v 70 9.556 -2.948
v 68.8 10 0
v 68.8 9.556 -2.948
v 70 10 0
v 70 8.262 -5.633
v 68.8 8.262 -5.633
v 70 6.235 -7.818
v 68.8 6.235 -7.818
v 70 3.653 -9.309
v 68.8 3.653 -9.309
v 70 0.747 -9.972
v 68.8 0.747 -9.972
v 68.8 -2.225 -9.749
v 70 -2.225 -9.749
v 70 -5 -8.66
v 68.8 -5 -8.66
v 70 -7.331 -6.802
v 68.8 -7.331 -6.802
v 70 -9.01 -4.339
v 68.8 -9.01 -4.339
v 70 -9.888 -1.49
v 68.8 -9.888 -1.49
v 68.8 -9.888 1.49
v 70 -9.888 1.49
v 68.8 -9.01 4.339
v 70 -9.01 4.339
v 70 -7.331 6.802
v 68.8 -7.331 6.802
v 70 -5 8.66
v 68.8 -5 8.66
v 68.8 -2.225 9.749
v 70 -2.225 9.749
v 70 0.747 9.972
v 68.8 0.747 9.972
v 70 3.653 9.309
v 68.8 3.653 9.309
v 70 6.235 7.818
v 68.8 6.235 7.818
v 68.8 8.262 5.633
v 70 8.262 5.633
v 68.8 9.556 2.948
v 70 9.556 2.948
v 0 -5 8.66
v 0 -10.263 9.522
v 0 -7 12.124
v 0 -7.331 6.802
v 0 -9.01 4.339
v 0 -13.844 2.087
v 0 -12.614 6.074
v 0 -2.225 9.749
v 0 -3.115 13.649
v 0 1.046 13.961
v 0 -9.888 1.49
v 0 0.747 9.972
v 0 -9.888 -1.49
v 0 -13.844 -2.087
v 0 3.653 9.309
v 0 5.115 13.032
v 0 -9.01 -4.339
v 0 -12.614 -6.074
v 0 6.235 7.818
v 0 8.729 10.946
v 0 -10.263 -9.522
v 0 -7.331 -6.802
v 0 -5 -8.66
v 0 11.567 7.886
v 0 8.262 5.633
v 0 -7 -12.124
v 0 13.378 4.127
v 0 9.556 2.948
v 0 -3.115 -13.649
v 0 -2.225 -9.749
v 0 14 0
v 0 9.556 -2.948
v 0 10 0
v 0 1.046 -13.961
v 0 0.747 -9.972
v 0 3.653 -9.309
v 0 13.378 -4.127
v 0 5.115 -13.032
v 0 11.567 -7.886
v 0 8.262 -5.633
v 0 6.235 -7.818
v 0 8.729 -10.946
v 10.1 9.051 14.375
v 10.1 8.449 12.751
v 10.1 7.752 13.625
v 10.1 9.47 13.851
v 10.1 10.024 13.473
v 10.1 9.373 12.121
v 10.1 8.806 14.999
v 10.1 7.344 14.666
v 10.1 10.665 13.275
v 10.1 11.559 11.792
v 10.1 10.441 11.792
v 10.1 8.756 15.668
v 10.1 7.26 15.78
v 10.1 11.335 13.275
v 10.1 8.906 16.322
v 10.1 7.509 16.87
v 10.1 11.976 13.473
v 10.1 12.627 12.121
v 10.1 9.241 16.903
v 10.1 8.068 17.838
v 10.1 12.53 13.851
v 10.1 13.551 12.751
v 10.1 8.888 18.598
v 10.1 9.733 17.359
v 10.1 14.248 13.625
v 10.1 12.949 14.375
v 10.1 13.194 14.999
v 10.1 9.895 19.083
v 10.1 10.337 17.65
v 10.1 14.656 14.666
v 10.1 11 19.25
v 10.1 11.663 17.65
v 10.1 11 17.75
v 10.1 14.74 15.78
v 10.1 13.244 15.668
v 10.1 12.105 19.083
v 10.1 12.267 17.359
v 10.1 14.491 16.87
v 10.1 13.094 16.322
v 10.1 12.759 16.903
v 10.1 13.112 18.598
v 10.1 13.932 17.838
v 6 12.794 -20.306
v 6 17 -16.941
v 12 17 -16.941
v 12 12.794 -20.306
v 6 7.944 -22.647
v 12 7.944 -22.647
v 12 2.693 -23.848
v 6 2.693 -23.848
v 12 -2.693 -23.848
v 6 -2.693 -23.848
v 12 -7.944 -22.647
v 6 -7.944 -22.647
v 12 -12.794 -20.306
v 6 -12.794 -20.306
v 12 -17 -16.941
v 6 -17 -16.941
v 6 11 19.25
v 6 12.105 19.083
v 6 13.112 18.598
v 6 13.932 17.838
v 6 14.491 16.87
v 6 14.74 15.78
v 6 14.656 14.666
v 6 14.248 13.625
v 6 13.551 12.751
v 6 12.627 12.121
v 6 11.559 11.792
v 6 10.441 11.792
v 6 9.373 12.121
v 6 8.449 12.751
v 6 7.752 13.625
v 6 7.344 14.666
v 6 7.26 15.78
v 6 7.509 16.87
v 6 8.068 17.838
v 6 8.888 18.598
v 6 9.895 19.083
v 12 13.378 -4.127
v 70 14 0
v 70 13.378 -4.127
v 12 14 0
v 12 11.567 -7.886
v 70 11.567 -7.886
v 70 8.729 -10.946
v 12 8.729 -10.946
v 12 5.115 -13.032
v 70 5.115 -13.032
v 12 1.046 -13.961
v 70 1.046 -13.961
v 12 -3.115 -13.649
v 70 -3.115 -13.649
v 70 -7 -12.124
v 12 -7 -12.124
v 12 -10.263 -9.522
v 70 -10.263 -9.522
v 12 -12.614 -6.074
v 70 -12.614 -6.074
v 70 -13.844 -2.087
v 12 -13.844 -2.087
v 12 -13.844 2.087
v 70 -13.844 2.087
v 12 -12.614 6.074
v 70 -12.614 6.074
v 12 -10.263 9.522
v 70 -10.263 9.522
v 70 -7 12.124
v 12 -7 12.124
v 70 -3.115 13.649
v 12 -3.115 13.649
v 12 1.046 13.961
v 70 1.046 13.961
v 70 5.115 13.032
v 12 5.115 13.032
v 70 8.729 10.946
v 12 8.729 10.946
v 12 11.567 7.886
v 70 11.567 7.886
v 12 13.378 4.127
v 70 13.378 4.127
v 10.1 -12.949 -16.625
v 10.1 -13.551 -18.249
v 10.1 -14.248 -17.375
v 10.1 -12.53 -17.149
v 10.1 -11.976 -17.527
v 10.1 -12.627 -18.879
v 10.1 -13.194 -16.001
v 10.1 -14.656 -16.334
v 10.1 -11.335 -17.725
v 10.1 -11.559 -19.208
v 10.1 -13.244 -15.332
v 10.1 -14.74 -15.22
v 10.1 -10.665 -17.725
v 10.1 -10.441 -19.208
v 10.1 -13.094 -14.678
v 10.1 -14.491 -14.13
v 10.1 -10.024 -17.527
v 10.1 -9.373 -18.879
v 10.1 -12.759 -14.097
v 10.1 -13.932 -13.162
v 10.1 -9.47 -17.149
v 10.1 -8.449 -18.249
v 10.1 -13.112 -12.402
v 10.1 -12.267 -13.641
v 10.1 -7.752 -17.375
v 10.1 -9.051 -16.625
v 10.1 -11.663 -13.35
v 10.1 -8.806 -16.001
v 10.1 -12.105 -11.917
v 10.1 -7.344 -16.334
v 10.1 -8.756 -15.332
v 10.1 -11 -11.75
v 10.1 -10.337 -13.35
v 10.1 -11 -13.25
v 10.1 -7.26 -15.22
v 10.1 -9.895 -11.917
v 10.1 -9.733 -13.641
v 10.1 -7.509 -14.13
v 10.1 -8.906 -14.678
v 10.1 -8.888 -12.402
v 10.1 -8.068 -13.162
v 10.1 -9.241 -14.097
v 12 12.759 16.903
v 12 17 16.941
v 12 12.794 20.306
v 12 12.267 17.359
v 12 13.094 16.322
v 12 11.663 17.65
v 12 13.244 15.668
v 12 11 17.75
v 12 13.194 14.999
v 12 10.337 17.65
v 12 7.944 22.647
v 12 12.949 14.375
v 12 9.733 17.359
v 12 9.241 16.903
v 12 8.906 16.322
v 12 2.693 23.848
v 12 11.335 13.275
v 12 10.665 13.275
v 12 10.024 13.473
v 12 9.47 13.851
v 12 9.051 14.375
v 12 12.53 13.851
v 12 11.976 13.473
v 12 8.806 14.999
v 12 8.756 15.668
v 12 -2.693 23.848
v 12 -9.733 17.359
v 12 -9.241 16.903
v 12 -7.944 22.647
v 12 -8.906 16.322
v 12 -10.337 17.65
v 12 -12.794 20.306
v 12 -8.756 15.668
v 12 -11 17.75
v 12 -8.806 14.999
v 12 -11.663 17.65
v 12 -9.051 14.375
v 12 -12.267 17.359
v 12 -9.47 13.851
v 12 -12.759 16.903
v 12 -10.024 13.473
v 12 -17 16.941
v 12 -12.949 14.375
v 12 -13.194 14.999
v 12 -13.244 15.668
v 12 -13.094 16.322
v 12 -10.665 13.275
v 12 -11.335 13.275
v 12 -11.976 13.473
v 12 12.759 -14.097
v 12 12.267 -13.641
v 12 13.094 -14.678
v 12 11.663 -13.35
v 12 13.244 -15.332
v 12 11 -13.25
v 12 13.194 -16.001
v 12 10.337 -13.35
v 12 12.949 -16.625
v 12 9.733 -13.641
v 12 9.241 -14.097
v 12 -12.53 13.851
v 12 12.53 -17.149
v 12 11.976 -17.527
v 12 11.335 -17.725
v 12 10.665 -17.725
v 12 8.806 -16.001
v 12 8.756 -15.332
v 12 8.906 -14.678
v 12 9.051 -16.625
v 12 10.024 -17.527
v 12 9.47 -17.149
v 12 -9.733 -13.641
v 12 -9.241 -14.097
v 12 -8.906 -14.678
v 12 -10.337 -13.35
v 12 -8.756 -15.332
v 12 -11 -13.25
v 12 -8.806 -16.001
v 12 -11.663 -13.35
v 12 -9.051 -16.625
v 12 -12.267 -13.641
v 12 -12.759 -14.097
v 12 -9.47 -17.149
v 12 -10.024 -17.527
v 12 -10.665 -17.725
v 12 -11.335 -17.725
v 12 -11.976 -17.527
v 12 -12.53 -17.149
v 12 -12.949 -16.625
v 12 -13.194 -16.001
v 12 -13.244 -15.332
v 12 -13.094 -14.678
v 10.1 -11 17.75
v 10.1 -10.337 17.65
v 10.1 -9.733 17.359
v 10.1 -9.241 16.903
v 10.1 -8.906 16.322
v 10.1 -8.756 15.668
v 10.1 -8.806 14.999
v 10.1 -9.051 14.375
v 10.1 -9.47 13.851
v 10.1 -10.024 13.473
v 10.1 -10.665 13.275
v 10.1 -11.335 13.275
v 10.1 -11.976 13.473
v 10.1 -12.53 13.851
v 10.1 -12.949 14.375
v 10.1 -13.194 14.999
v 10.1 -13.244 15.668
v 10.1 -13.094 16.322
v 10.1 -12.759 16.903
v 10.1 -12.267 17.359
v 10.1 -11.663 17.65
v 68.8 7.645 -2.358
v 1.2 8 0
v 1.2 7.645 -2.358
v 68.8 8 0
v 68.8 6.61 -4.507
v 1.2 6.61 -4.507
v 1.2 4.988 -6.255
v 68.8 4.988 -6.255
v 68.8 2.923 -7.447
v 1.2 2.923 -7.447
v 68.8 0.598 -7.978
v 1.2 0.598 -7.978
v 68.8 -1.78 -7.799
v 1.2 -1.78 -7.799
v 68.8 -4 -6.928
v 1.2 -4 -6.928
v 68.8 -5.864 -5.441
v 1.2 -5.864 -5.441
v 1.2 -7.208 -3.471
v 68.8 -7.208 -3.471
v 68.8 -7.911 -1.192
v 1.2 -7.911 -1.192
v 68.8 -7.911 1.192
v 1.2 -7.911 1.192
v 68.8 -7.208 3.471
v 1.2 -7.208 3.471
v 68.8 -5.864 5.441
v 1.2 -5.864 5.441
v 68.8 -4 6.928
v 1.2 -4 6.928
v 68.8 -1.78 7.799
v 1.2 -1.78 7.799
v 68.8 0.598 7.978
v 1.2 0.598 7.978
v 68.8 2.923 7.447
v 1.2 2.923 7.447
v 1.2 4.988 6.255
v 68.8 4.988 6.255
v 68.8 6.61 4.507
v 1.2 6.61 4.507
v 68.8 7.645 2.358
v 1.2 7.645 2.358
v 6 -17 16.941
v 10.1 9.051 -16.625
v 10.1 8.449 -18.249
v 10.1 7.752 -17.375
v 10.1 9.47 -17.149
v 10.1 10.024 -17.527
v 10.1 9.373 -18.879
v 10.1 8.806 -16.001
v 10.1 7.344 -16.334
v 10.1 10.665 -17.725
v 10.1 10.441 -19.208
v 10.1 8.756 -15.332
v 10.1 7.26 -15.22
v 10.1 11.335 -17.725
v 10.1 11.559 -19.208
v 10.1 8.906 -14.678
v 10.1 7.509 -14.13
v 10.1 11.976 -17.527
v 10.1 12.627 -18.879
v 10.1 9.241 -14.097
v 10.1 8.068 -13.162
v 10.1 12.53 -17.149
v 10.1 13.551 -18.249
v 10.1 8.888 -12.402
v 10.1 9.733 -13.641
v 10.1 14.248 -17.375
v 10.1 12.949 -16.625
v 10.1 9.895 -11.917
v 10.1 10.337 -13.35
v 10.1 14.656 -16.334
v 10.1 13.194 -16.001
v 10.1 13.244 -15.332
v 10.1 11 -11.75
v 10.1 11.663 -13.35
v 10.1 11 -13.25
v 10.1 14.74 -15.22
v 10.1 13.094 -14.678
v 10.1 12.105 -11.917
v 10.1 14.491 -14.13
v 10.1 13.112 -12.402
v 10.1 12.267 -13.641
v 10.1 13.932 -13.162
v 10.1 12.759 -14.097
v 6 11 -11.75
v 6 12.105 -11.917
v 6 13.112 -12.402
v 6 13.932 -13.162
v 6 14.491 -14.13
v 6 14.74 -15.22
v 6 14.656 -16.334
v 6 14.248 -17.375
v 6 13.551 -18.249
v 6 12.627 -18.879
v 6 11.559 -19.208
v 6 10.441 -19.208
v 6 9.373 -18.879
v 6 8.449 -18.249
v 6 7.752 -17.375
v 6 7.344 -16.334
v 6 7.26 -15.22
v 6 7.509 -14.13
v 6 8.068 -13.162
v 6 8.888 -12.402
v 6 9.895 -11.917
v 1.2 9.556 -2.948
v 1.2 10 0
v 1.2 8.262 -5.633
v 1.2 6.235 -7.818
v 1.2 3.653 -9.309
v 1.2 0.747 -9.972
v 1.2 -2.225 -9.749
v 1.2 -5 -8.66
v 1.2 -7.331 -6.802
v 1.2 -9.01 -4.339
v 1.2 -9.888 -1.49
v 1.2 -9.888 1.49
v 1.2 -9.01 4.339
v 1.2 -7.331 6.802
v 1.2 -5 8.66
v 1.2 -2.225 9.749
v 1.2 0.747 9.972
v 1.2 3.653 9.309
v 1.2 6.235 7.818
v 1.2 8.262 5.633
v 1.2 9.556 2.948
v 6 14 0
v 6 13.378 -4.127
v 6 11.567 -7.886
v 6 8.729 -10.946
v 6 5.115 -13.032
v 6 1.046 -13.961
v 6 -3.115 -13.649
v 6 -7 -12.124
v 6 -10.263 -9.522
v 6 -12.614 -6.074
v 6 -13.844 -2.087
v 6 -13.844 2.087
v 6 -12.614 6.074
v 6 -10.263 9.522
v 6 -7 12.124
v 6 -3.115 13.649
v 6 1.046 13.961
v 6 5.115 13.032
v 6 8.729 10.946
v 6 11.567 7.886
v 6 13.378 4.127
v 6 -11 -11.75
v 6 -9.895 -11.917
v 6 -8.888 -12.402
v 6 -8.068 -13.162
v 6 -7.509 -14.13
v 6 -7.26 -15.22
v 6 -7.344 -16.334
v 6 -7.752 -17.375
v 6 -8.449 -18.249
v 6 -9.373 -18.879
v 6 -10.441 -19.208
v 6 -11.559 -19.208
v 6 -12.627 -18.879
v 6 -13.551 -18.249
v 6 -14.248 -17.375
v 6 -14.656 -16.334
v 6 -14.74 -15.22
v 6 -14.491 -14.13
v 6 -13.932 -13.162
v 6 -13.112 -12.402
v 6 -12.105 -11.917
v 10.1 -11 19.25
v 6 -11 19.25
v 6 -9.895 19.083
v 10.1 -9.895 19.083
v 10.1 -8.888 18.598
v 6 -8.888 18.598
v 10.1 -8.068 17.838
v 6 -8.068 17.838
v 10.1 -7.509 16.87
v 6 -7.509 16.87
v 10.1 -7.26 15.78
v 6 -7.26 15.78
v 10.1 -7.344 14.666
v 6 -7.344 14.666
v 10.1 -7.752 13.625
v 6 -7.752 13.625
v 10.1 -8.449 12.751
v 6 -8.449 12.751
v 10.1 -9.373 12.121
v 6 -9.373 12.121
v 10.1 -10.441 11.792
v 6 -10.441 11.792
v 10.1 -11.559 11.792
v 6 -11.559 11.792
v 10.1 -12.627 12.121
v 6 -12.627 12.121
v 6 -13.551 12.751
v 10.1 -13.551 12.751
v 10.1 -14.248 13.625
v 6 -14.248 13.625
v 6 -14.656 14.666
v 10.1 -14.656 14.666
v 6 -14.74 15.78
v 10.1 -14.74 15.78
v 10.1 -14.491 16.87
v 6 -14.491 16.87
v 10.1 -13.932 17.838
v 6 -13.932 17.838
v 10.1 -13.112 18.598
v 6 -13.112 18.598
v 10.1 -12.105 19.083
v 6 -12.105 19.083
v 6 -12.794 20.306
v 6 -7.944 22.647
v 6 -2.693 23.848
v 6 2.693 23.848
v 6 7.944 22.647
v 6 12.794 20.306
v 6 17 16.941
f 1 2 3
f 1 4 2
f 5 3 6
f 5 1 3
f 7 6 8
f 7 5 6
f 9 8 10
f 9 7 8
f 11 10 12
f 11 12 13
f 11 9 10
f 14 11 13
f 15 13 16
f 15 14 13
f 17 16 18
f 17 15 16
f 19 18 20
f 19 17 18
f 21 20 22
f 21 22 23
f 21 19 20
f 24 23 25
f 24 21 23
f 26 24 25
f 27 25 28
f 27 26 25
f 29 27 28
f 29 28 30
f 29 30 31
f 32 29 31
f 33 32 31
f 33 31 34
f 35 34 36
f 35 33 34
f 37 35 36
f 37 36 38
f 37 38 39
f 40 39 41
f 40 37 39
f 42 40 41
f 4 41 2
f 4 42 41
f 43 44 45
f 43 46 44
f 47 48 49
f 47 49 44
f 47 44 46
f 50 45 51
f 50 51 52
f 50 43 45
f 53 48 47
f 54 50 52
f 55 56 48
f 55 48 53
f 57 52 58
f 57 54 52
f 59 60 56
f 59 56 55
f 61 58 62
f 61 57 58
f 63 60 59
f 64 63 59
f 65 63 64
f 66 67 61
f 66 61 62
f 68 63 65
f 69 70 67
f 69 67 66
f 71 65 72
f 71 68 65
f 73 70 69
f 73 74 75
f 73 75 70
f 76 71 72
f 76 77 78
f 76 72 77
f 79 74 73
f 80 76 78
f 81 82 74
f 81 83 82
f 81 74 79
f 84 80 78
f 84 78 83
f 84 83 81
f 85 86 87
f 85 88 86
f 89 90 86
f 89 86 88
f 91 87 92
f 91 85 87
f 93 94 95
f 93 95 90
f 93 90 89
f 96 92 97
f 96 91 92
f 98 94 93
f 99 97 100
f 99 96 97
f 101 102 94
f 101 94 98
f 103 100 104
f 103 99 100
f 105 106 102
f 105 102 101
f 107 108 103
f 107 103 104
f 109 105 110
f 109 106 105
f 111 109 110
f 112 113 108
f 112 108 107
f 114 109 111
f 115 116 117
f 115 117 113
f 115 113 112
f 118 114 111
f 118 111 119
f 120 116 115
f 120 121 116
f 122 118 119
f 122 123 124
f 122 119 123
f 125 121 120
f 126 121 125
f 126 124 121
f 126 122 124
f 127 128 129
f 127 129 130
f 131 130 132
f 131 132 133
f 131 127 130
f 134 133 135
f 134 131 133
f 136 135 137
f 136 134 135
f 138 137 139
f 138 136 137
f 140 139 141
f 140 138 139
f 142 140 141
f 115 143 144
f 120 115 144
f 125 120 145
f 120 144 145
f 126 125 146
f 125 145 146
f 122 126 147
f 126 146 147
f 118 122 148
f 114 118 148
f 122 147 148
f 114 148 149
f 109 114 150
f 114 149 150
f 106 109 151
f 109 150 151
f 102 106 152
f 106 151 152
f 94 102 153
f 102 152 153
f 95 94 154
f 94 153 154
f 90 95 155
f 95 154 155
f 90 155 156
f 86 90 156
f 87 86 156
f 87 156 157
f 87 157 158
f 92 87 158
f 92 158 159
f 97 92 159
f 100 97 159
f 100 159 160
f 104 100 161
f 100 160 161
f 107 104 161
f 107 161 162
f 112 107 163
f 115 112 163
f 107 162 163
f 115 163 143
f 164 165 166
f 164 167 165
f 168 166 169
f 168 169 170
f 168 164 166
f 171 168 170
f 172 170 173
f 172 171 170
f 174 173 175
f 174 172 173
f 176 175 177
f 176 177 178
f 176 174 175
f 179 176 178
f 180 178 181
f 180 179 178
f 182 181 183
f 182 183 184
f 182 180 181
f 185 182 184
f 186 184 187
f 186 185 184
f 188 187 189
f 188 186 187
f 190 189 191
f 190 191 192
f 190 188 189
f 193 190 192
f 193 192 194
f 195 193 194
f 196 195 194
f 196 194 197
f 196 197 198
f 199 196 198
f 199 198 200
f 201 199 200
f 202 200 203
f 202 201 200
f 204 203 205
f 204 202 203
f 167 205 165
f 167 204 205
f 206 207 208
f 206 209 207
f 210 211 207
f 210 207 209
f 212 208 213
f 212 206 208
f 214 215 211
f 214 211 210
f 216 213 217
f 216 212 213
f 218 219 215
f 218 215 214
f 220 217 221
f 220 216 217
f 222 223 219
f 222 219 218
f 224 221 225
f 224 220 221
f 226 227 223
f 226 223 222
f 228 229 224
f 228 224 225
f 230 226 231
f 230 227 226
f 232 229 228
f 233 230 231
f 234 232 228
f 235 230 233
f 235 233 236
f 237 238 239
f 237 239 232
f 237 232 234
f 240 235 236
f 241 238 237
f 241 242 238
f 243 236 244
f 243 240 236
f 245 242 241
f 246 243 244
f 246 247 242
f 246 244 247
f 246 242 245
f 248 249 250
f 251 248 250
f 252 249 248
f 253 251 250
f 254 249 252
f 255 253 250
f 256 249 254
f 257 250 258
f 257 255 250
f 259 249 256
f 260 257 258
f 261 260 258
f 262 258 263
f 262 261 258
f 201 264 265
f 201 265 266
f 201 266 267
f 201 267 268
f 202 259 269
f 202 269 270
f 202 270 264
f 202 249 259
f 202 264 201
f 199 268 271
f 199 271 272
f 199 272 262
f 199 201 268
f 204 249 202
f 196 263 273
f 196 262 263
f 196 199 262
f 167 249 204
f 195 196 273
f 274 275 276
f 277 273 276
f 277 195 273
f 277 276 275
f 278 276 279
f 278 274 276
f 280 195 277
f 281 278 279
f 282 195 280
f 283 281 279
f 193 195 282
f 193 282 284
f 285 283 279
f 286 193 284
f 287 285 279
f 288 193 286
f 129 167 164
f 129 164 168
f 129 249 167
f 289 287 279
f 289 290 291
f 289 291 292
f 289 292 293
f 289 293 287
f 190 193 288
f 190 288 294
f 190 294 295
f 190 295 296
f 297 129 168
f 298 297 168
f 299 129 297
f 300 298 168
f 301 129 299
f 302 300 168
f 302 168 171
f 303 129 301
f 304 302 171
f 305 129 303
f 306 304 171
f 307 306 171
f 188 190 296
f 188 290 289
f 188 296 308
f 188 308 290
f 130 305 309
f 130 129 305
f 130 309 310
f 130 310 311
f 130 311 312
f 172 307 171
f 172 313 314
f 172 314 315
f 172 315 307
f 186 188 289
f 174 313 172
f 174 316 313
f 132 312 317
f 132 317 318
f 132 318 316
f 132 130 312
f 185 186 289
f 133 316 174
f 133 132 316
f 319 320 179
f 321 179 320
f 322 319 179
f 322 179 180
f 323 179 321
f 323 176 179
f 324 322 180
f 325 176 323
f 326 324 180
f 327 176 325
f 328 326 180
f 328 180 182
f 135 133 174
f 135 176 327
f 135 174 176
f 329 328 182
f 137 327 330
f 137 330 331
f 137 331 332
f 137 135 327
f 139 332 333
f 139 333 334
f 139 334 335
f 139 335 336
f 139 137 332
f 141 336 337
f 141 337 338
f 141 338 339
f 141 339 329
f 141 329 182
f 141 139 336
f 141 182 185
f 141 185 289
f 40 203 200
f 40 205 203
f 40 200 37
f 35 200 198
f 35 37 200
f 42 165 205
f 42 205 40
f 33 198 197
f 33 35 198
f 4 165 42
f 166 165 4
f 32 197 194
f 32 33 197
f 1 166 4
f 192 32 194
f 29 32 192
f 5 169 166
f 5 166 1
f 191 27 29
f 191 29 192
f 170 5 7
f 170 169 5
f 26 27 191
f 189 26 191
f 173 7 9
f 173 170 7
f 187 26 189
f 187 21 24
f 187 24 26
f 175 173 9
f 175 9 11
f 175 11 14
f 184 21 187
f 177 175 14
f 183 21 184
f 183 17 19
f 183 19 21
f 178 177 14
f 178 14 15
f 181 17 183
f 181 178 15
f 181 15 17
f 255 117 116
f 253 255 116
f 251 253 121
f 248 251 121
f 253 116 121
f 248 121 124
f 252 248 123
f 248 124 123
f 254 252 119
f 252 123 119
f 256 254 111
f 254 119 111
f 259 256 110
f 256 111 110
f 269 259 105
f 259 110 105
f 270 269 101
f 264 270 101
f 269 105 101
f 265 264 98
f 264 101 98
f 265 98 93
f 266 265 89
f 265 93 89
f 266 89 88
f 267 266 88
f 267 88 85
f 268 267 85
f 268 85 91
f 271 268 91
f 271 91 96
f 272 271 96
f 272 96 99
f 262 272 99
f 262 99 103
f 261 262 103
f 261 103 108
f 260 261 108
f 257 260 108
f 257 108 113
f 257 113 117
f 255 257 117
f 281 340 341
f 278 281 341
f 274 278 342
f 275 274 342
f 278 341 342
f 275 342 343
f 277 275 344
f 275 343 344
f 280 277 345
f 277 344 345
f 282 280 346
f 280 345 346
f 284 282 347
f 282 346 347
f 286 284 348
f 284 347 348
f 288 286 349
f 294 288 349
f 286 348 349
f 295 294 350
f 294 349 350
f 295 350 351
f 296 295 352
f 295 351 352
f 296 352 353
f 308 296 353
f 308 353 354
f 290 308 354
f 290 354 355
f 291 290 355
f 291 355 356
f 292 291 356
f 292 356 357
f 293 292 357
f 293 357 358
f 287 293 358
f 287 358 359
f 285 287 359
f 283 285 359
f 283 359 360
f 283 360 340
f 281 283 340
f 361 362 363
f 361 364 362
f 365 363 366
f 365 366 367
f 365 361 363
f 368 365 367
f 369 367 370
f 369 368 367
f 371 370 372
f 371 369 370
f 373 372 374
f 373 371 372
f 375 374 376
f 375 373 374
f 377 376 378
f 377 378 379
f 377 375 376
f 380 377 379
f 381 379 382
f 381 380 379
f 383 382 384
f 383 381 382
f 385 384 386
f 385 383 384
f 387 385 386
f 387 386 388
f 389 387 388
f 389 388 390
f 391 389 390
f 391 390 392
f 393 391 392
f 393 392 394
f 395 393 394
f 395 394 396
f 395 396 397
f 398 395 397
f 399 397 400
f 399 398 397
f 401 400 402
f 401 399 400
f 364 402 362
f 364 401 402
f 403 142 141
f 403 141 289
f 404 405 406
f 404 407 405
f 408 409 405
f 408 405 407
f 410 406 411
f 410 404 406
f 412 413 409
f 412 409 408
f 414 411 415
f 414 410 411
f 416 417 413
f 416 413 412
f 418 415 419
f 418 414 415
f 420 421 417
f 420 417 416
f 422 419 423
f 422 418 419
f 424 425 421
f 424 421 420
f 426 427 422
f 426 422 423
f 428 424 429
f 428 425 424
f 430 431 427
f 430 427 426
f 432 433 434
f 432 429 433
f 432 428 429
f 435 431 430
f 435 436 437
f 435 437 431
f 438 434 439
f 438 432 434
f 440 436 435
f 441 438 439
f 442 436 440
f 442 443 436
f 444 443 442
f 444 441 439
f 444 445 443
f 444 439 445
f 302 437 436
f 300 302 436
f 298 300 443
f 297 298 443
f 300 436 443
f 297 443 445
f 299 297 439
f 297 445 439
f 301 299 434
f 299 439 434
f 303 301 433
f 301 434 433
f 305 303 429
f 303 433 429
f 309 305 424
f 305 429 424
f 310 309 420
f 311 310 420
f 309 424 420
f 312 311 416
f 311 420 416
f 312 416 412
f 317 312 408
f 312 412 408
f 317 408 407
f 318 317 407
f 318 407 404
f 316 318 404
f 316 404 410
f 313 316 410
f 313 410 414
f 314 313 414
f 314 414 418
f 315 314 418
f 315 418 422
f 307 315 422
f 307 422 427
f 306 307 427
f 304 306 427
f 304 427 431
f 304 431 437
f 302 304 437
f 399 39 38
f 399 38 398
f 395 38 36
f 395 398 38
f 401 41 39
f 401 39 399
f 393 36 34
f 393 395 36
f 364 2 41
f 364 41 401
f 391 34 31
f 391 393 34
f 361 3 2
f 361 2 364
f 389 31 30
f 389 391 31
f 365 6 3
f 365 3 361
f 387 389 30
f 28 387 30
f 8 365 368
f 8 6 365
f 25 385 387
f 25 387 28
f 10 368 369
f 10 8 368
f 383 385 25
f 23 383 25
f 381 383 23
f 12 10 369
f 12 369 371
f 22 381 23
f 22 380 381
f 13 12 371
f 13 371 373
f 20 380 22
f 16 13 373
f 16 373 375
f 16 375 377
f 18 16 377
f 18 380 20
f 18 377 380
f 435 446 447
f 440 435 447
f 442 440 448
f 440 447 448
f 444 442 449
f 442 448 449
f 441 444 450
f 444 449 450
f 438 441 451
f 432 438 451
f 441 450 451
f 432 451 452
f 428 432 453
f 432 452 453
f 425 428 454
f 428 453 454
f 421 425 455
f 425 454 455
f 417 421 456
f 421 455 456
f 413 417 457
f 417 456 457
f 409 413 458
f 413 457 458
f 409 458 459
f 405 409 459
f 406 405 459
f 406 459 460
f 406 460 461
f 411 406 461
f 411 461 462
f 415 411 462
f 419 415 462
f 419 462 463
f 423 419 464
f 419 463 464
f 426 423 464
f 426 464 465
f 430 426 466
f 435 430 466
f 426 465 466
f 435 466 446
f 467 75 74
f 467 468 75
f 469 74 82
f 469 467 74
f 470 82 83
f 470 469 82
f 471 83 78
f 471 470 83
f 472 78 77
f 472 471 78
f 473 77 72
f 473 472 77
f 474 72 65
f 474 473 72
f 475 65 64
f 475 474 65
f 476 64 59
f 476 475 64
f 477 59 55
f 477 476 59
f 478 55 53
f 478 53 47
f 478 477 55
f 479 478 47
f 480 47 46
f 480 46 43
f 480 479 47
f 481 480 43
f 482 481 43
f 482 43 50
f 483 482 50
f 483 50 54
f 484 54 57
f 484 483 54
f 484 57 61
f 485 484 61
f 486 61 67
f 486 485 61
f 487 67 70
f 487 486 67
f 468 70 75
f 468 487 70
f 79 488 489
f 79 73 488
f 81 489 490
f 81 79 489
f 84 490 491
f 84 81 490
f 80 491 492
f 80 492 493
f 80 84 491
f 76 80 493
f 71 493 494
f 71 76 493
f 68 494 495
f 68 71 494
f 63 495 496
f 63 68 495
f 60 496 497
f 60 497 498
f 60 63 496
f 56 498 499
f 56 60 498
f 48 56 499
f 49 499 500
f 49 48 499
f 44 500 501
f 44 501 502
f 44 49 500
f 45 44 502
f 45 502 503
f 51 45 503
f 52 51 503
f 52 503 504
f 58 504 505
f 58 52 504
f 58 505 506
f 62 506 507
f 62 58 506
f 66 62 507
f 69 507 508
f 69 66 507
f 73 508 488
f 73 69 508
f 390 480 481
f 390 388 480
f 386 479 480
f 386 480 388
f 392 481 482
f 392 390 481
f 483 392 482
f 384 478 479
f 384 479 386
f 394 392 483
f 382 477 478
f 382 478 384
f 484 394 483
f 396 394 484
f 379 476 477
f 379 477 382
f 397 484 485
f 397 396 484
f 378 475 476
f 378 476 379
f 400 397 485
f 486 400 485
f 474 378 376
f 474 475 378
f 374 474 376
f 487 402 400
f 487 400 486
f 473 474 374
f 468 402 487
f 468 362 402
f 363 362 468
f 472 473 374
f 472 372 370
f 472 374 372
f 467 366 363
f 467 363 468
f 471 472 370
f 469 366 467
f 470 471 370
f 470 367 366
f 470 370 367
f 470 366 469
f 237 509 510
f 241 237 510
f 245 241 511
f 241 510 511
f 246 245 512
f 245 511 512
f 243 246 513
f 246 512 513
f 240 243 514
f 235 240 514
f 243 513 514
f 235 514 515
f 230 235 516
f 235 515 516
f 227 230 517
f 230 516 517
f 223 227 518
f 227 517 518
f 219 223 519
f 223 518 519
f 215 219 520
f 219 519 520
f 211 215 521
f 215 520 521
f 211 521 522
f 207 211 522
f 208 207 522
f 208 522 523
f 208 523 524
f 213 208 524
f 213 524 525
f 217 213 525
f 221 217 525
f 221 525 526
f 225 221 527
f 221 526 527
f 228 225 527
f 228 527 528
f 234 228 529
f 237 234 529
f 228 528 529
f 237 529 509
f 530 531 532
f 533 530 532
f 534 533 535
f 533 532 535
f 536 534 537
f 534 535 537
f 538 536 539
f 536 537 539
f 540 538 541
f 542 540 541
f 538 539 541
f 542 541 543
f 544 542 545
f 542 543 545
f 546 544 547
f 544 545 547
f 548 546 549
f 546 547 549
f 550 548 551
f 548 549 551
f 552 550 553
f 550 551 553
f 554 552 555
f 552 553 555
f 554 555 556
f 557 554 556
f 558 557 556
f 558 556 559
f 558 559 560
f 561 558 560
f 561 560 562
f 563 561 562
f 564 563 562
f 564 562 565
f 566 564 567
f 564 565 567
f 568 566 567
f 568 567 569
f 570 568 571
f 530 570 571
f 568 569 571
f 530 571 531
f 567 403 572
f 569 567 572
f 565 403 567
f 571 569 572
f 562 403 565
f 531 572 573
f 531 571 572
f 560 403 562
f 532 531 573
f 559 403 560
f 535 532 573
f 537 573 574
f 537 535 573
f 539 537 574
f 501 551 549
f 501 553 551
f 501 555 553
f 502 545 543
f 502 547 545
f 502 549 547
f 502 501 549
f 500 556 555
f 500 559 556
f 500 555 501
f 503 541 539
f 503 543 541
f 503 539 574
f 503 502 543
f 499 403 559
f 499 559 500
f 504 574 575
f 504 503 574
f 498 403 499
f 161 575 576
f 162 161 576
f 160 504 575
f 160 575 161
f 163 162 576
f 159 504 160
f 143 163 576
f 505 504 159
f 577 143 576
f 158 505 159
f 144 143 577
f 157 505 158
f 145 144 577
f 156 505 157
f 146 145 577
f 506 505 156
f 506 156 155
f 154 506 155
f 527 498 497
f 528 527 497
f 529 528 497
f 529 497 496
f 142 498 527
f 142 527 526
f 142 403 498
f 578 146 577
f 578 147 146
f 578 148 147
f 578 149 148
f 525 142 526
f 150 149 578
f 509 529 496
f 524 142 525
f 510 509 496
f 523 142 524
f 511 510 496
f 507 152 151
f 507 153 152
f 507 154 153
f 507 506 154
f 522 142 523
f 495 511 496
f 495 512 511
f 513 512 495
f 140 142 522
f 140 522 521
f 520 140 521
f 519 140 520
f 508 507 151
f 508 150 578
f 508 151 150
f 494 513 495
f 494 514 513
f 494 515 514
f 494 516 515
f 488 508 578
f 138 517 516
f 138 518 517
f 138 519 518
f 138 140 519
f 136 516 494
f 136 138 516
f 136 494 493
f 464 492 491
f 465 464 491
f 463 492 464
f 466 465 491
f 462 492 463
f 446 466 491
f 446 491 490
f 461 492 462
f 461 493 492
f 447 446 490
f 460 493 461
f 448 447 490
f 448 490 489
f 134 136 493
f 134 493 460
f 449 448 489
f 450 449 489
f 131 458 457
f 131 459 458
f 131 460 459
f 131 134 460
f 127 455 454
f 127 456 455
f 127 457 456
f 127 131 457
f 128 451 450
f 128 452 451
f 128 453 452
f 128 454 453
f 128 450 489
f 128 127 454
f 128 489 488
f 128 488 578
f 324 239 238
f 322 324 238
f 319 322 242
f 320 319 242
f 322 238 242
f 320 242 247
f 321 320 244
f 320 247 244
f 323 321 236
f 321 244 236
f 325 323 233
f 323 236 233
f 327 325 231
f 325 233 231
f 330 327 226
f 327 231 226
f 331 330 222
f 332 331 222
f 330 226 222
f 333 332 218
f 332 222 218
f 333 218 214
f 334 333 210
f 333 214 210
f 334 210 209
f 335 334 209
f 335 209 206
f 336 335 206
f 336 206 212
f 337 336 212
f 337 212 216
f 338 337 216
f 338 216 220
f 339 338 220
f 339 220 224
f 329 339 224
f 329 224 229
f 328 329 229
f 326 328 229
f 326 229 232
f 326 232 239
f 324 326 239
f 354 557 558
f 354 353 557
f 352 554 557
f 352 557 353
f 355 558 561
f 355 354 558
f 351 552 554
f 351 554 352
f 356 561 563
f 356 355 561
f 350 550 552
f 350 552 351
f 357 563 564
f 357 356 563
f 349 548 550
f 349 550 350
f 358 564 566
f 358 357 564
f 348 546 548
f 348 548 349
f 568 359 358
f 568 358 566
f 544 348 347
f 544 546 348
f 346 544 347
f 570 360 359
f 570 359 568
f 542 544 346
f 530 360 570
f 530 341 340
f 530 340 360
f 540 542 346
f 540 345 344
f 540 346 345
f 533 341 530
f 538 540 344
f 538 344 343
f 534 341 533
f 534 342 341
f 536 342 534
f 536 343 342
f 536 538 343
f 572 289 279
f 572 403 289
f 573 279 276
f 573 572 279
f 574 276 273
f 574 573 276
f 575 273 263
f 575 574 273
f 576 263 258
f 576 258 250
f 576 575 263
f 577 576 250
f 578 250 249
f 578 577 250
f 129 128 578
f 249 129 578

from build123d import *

# Parameters (mm, degrees)
SKETCH_4_R          = 2.25
CUT_EXTRUDE_1_DEPTH = 73.443081105
SKETCH_5_R          = 3.75
CUT_EXTRUDE_4_DEPTH = 4.1
CUT_EXTRUDE_3_DEPTH = 73.443081105


with BuildPart() as part:
    # 草图1 → 旋转1 (revolve)
    with BuildSketch(Plane.XY):
        Polygon((12, 24), (6, 24), (6, 14), (0, 14), (0, 10), (1.2, 10), (1.2, 8), (68.8, 8), (68.8, 10), (70, 10), (70, 14), (12, 14), align=None)
    revolve(axis=Axis((70, 0, 0), (-1, 0, 0)))

    # 草图4 → 切除-拉伸1 (cut, through all)
    with BuildSketch(Plane.ZY.offset(-6)):
        with Locations((15.5, 11)):
            Circle(SKETCH_4_R)
        with Locations((-15.5, -11)):
            Circle(SKETCH_4_R)
        with Locations((-15.5, 11)):
            Circle(SKETCH_4_R)
        with Locations((15.5, -11)):
            Circle(SKETCH_4_R)
    extrude(amount=-CUT_EXTRUDE_1_DEPTH, mode=Mode.SUBTRACT)

    # 草图5 → 切除-拉伸4 (cut)
    with BuildSketch(Plane.ZY.offset(-6)):
        with Locations((15.5, 11)):
            Circle(SKETCH_5_R)
        with Locations((-15.5, 11)):
            Circle(SKETCH_5_R)
        with Locations((-15.5, -11)):
            Circle(SKETCH_5_R)
        with Locations((15.5, -11)):
            Circle(SKETCH_5_R)
    extrude(amount=-CUT_EXTRUDE_4_DEPTH, mode=Mode.SUBTRACT)

    # 草图7 → 切除-拉伸3 (cut, through all)
    with BuildSketch(Plane.ZY.offset(-6)):
        with BuildLine():
            ThreePointArc((16.941074346, 17), (0, 24), (-16.941074346, 17))
            Line((-16.941074346, 17), (16.941074346, 17))
        make_face()
        with BuildLine():
            Line((16.941074346, -17), (-16.941074346, -17))
            ThreePointArc((-16.941074346, -17), (0, -24), (16.941074346, -17))
        make_face()
    extrude(amount=-CUT_EXTRUDE_3_DEPTH, mode=Mode.SUBTRACT)


solid = part.part
